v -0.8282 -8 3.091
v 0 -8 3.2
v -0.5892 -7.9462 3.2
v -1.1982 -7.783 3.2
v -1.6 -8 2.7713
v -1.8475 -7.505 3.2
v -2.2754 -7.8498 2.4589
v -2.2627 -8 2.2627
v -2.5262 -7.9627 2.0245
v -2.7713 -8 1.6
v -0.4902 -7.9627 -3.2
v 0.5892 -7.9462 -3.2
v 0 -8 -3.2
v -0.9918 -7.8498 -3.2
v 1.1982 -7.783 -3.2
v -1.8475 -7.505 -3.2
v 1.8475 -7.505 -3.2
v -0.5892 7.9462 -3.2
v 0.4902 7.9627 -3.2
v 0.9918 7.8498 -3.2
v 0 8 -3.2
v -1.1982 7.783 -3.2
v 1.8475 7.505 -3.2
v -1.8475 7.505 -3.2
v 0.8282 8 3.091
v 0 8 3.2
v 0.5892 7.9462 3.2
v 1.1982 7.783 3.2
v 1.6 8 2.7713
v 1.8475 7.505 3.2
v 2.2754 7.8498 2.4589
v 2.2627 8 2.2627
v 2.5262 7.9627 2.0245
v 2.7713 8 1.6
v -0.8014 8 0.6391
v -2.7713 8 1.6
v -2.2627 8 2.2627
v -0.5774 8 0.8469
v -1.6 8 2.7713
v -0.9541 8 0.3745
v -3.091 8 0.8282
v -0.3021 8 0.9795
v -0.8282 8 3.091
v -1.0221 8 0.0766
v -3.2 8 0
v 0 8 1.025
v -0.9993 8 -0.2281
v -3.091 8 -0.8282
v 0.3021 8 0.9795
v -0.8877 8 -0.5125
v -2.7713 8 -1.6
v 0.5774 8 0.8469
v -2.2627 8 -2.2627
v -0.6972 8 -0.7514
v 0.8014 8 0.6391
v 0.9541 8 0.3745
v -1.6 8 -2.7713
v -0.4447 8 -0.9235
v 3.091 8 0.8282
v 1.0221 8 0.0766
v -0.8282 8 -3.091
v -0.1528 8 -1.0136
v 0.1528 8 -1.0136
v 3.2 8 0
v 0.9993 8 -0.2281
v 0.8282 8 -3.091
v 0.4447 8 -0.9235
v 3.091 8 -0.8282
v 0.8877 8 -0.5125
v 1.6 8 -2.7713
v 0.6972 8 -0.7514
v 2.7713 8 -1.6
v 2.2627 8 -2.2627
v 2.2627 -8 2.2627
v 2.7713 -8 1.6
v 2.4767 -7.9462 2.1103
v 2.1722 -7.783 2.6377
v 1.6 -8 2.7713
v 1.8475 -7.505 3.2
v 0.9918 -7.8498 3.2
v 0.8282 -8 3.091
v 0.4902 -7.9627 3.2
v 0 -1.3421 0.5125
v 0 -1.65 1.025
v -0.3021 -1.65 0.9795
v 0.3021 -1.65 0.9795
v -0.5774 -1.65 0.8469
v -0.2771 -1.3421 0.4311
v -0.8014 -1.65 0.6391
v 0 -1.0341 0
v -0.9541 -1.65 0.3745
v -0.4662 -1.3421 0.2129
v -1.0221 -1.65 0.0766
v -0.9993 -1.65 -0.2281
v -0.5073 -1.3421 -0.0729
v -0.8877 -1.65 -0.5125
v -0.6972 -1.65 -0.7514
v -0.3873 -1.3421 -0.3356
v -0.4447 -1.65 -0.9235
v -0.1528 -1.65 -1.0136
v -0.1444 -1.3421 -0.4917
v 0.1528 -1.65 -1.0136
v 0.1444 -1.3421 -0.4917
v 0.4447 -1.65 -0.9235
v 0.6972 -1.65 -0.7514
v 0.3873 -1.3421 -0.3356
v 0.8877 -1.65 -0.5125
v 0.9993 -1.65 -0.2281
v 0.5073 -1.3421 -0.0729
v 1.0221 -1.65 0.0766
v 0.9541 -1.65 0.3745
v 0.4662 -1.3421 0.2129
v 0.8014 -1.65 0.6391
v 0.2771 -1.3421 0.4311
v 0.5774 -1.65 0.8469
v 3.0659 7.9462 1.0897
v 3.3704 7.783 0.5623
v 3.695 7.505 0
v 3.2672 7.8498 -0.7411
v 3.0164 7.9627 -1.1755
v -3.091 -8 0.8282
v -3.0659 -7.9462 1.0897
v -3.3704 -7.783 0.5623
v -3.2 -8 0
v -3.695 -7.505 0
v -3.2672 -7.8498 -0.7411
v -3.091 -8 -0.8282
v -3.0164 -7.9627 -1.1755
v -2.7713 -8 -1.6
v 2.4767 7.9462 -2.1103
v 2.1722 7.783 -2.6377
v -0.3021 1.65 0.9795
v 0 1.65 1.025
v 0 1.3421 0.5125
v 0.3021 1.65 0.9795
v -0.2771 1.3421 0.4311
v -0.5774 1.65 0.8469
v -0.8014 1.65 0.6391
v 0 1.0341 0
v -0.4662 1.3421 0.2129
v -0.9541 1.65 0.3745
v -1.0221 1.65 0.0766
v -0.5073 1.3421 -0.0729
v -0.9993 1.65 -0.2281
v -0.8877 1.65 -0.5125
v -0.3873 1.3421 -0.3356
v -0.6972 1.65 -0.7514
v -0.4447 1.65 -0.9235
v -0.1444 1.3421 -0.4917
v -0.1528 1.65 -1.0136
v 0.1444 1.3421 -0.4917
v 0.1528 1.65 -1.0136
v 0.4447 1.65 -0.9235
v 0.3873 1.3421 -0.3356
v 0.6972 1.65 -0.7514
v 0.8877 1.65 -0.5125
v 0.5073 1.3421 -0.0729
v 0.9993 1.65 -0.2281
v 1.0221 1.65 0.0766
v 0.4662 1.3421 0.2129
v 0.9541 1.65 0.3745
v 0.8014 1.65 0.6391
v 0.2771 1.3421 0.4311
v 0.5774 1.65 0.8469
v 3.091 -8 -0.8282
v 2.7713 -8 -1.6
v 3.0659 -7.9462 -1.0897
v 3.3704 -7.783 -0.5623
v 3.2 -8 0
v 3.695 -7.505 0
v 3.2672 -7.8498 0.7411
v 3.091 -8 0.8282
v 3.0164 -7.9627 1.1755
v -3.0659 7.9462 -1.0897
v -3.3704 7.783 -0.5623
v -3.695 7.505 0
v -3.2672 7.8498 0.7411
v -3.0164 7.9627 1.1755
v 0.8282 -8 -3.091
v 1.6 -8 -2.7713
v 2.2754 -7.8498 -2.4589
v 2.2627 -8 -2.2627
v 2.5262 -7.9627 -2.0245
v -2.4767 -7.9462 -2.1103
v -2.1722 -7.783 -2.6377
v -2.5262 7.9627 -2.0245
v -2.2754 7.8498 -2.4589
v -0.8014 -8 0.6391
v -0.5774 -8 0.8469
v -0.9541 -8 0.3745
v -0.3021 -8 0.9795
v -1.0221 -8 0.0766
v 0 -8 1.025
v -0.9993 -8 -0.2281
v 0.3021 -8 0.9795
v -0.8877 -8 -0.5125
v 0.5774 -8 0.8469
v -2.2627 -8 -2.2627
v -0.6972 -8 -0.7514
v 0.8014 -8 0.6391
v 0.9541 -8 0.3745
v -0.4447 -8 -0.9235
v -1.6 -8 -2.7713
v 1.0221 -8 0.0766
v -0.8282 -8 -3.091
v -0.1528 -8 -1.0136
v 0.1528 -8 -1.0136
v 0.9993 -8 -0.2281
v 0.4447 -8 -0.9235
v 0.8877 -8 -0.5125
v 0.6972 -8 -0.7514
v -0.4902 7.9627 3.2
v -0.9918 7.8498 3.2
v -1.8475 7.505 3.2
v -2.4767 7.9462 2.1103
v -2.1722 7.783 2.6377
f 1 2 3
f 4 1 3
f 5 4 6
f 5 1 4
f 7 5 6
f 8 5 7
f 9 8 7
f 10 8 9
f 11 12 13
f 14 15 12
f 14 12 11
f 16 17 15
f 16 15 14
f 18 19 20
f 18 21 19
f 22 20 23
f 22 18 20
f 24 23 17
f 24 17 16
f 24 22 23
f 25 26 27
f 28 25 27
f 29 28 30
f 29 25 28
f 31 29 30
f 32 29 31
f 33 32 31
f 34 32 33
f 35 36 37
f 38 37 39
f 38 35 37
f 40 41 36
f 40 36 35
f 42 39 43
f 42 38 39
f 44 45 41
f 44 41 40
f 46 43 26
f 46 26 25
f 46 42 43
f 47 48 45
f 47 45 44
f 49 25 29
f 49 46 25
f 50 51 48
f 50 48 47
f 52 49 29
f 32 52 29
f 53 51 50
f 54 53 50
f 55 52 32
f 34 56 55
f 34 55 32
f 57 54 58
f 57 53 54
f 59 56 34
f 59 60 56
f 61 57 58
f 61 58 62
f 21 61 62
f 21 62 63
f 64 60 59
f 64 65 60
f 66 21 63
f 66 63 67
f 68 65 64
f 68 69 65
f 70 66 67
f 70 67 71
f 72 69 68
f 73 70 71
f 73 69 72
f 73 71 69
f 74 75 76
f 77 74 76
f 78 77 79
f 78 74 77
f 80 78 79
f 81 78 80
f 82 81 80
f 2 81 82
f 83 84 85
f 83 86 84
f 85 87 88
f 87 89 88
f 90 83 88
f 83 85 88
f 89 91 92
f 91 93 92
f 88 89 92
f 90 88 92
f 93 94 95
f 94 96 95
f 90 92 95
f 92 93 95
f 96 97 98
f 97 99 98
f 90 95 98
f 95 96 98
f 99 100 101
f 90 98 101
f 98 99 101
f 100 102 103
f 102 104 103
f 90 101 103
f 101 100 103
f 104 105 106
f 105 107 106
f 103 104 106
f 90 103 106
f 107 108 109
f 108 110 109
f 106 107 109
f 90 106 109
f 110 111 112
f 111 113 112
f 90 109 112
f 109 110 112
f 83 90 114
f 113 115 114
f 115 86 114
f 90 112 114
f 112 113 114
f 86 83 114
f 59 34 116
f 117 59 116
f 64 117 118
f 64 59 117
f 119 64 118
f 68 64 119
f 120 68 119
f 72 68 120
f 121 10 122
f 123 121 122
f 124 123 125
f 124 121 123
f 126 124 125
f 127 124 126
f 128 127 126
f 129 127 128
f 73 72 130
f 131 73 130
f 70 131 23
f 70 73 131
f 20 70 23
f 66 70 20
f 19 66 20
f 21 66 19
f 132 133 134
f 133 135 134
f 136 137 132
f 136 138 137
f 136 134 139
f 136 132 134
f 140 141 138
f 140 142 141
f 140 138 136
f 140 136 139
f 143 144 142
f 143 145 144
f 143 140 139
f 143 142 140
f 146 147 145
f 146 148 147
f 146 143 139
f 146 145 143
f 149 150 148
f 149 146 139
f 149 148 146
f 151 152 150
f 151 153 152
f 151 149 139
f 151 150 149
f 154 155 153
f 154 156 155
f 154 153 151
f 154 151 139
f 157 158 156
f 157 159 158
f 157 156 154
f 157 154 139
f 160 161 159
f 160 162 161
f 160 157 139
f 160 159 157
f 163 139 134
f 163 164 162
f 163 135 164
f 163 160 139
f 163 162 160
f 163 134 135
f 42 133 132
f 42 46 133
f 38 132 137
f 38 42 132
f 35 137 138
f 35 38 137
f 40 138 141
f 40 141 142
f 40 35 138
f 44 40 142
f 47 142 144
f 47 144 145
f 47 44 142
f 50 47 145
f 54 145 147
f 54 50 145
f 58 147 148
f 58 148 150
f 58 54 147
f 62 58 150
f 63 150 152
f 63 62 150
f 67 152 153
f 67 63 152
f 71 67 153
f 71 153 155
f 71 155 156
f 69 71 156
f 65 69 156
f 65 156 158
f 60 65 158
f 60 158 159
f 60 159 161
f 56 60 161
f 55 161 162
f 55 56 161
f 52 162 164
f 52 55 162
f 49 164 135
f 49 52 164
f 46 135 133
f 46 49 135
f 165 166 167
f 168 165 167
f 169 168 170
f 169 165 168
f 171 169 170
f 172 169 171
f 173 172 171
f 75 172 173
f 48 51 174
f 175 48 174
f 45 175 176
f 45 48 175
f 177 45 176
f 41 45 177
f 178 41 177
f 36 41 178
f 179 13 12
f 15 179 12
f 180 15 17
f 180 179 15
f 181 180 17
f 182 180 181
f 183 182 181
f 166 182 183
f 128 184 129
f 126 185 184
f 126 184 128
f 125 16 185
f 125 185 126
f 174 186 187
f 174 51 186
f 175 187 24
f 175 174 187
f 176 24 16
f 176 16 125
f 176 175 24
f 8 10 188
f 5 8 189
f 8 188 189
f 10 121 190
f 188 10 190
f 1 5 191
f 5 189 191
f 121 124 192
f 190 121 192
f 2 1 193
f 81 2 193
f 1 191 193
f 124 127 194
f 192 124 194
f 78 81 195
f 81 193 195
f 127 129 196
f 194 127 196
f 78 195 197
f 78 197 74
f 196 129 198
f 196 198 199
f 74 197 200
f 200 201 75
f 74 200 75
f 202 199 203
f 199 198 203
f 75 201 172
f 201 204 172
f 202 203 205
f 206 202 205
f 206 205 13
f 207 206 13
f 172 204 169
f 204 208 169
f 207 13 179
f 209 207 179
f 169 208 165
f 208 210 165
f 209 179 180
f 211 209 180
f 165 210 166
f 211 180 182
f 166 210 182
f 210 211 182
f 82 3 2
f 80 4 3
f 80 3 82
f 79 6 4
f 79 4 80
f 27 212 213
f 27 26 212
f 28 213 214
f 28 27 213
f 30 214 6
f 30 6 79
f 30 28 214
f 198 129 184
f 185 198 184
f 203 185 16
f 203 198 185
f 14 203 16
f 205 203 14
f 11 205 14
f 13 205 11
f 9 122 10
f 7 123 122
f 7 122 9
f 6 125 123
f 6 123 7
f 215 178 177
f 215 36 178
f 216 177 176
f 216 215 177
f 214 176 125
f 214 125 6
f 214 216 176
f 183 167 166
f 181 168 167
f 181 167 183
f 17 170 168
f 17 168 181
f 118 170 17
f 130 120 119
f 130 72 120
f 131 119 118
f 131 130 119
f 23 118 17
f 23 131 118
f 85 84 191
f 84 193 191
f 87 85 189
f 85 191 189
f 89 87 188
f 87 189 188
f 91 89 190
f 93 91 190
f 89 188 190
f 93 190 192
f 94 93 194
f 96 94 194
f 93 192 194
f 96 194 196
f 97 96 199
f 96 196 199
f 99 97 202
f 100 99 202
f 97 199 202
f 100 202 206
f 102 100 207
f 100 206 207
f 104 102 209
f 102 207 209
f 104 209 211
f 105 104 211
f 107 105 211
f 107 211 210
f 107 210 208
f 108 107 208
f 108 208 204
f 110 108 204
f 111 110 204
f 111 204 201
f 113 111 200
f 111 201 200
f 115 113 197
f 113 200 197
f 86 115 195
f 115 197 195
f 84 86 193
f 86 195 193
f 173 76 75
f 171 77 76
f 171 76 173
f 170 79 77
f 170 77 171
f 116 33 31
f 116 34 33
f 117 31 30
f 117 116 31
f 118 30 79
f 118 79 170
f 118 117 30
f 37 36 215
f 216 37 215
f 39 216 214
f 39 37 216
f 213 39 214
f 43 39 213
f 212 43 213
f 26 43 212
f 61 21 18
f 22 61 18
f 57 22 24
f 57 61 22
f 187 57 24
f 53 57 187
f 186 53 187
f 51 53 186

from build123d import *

# Parameters (mm, degrees)
BOSS_EXTRUDE1_DEPTH     = 8
SKETCH3_OUTSIDE_W       = 33.14
SKETCH3_OUTSIDE_H       = 32.15
SKETCH3_OUTSIDE_R       = 3.2
CUT_EXTRUDE1_DEPTH      = 10
CUT_EXTRUDE1_DRAFT      = -45
MIRROR2_COPY_1_SKETCH_W = 33.14
MIRROR2_COPY_1_SKETCH_H = 32.15
MIRROR2_COPY_1_SKETCH_R = 3.2
MIRROR2_COPY_1_DEPTH    = 10
MIRROR2_COPY_1_DRAFT    = -45


with BuildPart() as part:
    # Sketch1 → Boss-Extrude1 (new, symmetric)
    with BuildSketch(Plane(origin=(0, 0, 0), x_dir=(1, 0, 0), z_dir=(0, 1, 0))):
        Polygon((3.695041723, 0), (1.847520861, 3.2), (-1.847520861, 3.2), (-3.695041723, 0), (-1.847520861, -3.2), (1.847520861, -3.2), align=None)
    extrude(amount=BOSS_EXTRUDE1_DEPTH, both=True)


with BuildPart() as cut_extrude1_tool:
    # Sketch3 outside → Cut-Extrude1 (with draft: the straight prism first)
    with BuildSketch(Plane(origin=(0, 8, 0), x_dir=(1, 0, 0), z_dir=(0, 1, 0))):
        Rectangle(SKETCH3_OUTSIDE_W, SKETCH3_OUTSIDE_H)
        Circle(SKETCH3_OUTSIDE_R, mode=Mode.SUBTRACT)
    extrude(amount=-CUT_EXTRUDE1_DEPTH)
    # Cut-Extrude1: the draft: its side faces are tilted about the plane it starts from
    cut_extrude1_sides = [cut_extrude1_tool.faces().sort_by_distance(p)[0] for p in [
        (0, 3, 16.075),
        (16.57, 3, 0),
        (0, 3, -16.075),
        (-16.57, 3, 0),
        (-3.2, 3, 0),
    ]]
    draft(cut_extrude1_sides, Plane(origin=(0, 8, 0), x_dir=(1, 0, 0), z_dir=(0, 1, 0)), CUT_EXTRUDE1_DRAFT)


with BuildPart() as part_1:
    add(part.part)

    # Cut-Extrude1: cut by cut_extrude1_tool
    add(cut_extrude1_tool.part, mode=Mode.SUBTRACT)


with BuildPart() as mirror2_copy_1_tool:
    # Mirror2 copy 1 sketch → Mirror2 copy 1 (with draft: the straight prism first)
    with BuildSketch(Plane.XZ.offset(8)):
        Rectangle(MIRROR2_COPY_1_SKETCH_W, MIRROR2_COPY_1_SKETCH_H)
        Circle(MIRROR2_COPY_1_SKETCH_R, mode=Mode.SUBTRACT)
    extrude(amount=-MIRROR2_COPY_1_DEPTH)
    # Mirror2 copy 1: the draft: its side faces are tilted about the plane it starts from
    mirror2_copy_1_sides = [mirror2_copy_1_tool.faces().sort_by_distance(p)[0] for p in [
        (0, -3, 16.075),
        (16.57, -3, 0),
        (0, -3, -16.075),
        (-16.57, -3, 0),
        (-3.2, -3, 0),
    ]]
    draft(mirror2_copy_1_sides, Plane.XZ.offset(8), MIRROR2_COPY_1_DRAFT)


with BuildPart() as part_2:
    add(part_1.part)

    # Mirror2 copy 1: cut by mirror2_copy_1_tool
    add(mirror2_copy_1_tool.part, mode=Mode.SUBTRACT)

    # Sketch2 → M2.5 Tapped Hole1 (revolve, cut)
    with BuildSketch(Plane(origin=(0, 8, 0), x_dir=(0, 0, 1), z_dir=(1, 0, 0))):
        Polygon((0, 0), (0, 6.965882135), (1.025, 6.35), (1.025, 0), align=None)
    m2_5_tapped_hole1 = revolve(axis=Axis((0, 14.35, 0), (0, -1, 0)), mode=Mode.SUBTRACT)

    # Mirror1: M2.5 Tapped Hole1 across plane
    add(m2_5_tapped_hole1.mirror(Plane.ZX), mode=Mode.SUBTRACT)


solid = part_2.part
